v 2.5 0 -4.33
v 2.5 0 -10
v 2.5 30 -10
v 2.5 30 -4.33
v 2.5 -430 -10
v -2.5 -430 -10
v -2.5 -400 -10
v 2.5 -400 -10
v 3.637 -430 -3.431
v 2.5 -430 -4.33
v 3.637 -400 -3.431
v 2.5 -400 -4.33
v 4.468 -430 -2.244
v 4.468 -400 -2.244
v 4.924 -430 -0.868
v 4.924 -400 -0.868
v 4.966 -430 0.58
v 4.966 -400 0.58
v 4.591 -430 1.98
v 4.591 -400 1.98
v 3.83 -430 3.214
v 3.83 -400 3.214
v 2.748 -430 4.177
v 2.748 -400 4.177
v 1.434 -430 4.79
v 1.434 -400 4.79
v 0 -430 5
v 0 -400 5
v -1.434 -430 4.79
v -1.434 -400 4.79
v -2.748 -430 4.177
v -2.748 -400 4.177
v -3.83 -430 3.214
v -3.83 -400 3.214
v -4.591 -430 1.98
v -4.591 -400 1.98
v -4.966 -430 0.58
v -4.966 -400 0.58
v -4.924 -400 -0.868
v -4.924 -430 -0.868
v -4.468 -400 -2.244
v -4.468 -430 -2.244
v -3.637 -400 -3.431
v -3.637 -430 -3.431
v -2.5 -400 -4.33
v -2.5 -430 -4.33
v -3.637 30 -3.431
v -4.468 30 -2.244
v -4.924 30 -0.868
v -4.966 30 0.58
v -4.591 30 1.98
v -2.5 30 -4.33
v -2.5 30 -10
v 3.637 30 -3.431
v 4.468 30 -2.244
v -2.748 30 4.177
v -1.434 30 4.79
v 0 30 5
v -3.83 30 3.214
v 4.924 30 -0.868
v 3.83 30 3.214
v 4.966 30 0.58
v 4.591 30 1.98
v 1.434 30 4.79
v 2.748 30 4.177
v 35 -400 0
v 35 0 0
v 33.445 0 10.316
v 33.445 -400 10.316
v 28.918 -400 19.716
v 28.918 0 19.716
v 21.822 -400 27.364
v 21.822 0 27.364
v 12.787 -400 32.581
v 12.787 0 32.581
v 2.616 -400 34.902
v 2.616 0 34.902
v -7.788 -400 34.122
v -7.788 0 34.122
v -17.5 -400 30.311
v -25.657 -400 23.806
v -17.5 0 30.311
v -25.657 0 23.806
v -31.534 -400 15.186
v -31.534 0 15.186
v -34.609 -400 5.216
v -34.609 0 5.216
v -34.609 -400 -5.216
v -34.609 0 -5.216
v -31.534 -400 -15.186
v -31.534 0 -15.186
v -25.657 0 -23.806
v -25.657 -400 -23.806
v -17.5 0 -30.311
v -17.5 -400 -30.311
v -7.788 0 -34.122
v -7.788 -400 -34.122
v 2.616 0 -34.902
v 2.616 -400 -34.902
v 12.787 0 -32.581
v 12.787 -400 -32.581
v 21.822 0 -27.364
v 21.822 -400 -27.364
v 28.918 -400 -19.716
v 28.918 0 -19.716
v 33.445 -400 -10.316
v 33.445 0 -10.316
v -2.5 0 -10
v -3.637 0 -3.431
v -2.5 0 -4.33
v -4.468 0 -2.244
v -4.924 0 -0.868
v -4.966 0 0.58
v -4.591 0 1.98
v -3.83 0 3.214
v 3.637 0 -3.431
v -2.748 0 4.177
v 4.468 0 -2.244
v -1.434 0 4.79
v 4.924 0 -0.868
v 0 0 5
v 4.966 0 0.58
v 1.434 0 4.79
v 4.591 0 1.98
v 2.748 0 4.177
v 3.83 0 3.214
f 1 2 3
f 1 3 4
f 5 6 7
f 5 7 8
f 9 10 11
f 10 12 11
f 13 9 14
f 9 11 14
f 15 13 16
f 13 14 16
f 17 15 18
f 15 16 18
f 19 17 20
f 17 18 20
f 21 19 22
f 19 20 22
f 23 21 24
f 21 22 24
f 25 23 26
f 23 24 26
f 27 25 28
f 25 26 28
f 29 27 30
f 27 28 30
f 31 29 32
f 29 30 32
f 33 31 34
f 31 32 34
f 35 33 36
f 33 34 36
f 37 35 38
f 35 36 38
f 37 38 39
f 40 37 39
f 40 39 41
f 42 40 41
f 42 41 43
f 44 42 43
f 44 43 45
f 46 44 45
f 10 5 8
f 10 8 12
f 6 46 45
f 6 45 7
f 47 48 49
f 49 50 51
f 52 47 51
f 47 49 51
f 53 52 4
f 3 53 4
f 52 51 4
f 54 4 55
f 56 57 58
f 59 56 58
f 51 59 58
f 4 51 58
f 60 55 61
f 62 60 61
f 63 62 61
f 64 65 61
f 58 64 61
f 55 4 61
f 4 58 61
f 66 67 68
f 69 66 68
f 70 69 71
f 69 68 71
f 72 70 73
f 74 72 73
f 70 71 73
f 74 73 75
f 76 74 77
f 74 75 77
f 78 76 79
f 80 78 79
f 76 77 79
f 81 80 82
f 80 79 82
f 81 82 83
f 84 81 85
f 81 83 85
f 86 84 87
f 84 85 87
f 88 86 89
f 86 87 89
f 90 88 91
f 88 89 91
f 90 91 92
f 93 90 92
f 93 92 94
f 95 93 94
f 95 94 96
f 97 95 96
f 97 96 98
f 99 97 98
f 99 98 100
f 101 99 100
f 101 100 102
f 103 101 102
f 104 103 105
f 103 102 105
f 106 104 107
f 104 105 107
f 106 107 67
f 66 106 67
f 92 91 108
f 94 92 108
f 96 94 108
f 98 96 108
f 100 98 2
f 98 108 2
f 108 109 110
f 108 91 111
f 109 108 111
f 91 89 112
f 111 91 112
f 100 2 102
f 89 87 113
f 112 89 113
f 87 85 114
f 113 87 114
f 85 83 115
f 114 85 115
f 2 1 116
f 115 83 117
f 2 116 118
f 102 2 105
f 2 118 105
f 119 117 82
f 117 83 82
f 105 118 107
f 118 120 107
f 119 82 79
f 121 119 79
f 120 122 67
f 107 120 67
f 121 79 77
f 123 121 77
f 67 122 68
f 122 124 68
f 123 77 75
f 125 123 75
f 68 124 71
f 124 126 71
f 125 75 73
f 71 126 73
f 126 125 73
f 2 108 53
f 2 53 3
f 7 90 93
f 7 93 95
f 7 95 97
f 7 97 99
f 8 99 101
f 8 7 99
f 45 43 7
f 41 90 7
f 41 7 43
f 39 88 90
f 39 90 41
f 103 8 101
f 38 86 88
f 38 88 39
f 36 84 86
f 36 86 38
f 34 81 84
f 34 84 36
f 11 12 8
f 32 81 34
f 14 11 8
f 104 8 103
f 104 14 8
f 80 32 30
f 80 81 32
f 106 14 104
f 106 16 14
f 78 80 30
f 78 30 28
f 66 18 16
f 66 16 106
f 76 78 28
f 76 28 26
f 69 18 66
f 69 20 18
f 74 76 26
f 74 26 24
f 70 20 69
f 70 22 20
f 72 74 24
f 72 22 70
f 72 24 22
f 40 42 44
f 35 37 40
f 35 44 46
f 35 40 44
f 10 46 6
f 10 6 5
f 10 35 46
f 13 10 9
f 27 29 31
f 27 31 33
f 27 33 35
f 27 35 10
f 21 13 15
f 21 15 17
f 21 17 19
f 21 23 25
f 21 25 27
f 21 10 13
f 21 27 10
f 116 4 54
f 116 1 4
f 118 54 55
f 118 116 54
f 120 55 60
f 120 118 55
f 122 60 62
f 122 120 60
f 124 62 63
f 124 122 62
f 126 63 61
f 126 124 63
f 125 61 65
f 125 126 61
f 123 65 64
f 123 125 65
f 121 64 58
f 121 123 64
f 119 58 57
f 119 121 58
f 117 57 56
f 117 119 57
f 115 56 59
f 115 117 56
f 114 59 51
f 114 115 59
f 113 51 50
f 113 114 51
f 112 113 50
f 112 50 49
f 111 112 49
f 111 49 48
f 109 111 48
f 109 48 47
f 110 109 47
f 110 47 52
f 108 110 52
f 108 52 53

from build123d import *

# Parameters (mm, degrees)
F0_R     = 35
F1_DEPTH = 400
F2_R     = 5
F3_DEPTH = 30
F4_DEPTH = 430
F6_DEPTH = 30
F7_DEPTH = 430


with BuildPart() as f1:
    # F0 (on Front) → F1 (new body)
    with BuildSketch(Plane.XZ):
        Circle(F0_R)
    extrude(amount=F1_DEPTH)

    # F2 (on Front) → F3 (join)
    with BuildSketch(Plane.XZ):
        Circle(F2_R)
    extrude(amount=-F3_DEPTH)

    # F2 (on Front) → F4 (join)
    with BuildSketch(Plane.XZ):
        Circle(F2_R)
    extrude(amount=F4_DEPTH)

    # F5 (on face) → F6 (join, symmetric)
    with BuildSketch(Plane.XZ.offset(400)):
        with BuildLine():
            ThreePointArc((2.5, -4.3301270189), (0, -5), (-2.5, -4.3301270189))
            Line((-2.5, -4.3301270189), (-2.5, -10))
            Line((-2.5, -10), (2.5, -10))
            Line((2.5, -10), (2.5, -4.3301270189))
        make_face()
    extrude(amount=F6_DEPTH, both=True)

    # F5 (on face) → F7 (join)
    with BuildSketch(Plane.XZ.offset(400)):
        with BuildLine():
            ThreePointArc((2.5, -4.3301270189), (0, -5), (-2.5, -4.3301270189))
            Line((-2.5, -4.3301270189), (-2.5, -10))
            Line((-2.5, -10), (2.5, -10))
            Line((2.5, -10), (2.5, -4.3301270189))
        make_face()
    extrude(amount=-F7_DEPTH)


solid = f1.part
